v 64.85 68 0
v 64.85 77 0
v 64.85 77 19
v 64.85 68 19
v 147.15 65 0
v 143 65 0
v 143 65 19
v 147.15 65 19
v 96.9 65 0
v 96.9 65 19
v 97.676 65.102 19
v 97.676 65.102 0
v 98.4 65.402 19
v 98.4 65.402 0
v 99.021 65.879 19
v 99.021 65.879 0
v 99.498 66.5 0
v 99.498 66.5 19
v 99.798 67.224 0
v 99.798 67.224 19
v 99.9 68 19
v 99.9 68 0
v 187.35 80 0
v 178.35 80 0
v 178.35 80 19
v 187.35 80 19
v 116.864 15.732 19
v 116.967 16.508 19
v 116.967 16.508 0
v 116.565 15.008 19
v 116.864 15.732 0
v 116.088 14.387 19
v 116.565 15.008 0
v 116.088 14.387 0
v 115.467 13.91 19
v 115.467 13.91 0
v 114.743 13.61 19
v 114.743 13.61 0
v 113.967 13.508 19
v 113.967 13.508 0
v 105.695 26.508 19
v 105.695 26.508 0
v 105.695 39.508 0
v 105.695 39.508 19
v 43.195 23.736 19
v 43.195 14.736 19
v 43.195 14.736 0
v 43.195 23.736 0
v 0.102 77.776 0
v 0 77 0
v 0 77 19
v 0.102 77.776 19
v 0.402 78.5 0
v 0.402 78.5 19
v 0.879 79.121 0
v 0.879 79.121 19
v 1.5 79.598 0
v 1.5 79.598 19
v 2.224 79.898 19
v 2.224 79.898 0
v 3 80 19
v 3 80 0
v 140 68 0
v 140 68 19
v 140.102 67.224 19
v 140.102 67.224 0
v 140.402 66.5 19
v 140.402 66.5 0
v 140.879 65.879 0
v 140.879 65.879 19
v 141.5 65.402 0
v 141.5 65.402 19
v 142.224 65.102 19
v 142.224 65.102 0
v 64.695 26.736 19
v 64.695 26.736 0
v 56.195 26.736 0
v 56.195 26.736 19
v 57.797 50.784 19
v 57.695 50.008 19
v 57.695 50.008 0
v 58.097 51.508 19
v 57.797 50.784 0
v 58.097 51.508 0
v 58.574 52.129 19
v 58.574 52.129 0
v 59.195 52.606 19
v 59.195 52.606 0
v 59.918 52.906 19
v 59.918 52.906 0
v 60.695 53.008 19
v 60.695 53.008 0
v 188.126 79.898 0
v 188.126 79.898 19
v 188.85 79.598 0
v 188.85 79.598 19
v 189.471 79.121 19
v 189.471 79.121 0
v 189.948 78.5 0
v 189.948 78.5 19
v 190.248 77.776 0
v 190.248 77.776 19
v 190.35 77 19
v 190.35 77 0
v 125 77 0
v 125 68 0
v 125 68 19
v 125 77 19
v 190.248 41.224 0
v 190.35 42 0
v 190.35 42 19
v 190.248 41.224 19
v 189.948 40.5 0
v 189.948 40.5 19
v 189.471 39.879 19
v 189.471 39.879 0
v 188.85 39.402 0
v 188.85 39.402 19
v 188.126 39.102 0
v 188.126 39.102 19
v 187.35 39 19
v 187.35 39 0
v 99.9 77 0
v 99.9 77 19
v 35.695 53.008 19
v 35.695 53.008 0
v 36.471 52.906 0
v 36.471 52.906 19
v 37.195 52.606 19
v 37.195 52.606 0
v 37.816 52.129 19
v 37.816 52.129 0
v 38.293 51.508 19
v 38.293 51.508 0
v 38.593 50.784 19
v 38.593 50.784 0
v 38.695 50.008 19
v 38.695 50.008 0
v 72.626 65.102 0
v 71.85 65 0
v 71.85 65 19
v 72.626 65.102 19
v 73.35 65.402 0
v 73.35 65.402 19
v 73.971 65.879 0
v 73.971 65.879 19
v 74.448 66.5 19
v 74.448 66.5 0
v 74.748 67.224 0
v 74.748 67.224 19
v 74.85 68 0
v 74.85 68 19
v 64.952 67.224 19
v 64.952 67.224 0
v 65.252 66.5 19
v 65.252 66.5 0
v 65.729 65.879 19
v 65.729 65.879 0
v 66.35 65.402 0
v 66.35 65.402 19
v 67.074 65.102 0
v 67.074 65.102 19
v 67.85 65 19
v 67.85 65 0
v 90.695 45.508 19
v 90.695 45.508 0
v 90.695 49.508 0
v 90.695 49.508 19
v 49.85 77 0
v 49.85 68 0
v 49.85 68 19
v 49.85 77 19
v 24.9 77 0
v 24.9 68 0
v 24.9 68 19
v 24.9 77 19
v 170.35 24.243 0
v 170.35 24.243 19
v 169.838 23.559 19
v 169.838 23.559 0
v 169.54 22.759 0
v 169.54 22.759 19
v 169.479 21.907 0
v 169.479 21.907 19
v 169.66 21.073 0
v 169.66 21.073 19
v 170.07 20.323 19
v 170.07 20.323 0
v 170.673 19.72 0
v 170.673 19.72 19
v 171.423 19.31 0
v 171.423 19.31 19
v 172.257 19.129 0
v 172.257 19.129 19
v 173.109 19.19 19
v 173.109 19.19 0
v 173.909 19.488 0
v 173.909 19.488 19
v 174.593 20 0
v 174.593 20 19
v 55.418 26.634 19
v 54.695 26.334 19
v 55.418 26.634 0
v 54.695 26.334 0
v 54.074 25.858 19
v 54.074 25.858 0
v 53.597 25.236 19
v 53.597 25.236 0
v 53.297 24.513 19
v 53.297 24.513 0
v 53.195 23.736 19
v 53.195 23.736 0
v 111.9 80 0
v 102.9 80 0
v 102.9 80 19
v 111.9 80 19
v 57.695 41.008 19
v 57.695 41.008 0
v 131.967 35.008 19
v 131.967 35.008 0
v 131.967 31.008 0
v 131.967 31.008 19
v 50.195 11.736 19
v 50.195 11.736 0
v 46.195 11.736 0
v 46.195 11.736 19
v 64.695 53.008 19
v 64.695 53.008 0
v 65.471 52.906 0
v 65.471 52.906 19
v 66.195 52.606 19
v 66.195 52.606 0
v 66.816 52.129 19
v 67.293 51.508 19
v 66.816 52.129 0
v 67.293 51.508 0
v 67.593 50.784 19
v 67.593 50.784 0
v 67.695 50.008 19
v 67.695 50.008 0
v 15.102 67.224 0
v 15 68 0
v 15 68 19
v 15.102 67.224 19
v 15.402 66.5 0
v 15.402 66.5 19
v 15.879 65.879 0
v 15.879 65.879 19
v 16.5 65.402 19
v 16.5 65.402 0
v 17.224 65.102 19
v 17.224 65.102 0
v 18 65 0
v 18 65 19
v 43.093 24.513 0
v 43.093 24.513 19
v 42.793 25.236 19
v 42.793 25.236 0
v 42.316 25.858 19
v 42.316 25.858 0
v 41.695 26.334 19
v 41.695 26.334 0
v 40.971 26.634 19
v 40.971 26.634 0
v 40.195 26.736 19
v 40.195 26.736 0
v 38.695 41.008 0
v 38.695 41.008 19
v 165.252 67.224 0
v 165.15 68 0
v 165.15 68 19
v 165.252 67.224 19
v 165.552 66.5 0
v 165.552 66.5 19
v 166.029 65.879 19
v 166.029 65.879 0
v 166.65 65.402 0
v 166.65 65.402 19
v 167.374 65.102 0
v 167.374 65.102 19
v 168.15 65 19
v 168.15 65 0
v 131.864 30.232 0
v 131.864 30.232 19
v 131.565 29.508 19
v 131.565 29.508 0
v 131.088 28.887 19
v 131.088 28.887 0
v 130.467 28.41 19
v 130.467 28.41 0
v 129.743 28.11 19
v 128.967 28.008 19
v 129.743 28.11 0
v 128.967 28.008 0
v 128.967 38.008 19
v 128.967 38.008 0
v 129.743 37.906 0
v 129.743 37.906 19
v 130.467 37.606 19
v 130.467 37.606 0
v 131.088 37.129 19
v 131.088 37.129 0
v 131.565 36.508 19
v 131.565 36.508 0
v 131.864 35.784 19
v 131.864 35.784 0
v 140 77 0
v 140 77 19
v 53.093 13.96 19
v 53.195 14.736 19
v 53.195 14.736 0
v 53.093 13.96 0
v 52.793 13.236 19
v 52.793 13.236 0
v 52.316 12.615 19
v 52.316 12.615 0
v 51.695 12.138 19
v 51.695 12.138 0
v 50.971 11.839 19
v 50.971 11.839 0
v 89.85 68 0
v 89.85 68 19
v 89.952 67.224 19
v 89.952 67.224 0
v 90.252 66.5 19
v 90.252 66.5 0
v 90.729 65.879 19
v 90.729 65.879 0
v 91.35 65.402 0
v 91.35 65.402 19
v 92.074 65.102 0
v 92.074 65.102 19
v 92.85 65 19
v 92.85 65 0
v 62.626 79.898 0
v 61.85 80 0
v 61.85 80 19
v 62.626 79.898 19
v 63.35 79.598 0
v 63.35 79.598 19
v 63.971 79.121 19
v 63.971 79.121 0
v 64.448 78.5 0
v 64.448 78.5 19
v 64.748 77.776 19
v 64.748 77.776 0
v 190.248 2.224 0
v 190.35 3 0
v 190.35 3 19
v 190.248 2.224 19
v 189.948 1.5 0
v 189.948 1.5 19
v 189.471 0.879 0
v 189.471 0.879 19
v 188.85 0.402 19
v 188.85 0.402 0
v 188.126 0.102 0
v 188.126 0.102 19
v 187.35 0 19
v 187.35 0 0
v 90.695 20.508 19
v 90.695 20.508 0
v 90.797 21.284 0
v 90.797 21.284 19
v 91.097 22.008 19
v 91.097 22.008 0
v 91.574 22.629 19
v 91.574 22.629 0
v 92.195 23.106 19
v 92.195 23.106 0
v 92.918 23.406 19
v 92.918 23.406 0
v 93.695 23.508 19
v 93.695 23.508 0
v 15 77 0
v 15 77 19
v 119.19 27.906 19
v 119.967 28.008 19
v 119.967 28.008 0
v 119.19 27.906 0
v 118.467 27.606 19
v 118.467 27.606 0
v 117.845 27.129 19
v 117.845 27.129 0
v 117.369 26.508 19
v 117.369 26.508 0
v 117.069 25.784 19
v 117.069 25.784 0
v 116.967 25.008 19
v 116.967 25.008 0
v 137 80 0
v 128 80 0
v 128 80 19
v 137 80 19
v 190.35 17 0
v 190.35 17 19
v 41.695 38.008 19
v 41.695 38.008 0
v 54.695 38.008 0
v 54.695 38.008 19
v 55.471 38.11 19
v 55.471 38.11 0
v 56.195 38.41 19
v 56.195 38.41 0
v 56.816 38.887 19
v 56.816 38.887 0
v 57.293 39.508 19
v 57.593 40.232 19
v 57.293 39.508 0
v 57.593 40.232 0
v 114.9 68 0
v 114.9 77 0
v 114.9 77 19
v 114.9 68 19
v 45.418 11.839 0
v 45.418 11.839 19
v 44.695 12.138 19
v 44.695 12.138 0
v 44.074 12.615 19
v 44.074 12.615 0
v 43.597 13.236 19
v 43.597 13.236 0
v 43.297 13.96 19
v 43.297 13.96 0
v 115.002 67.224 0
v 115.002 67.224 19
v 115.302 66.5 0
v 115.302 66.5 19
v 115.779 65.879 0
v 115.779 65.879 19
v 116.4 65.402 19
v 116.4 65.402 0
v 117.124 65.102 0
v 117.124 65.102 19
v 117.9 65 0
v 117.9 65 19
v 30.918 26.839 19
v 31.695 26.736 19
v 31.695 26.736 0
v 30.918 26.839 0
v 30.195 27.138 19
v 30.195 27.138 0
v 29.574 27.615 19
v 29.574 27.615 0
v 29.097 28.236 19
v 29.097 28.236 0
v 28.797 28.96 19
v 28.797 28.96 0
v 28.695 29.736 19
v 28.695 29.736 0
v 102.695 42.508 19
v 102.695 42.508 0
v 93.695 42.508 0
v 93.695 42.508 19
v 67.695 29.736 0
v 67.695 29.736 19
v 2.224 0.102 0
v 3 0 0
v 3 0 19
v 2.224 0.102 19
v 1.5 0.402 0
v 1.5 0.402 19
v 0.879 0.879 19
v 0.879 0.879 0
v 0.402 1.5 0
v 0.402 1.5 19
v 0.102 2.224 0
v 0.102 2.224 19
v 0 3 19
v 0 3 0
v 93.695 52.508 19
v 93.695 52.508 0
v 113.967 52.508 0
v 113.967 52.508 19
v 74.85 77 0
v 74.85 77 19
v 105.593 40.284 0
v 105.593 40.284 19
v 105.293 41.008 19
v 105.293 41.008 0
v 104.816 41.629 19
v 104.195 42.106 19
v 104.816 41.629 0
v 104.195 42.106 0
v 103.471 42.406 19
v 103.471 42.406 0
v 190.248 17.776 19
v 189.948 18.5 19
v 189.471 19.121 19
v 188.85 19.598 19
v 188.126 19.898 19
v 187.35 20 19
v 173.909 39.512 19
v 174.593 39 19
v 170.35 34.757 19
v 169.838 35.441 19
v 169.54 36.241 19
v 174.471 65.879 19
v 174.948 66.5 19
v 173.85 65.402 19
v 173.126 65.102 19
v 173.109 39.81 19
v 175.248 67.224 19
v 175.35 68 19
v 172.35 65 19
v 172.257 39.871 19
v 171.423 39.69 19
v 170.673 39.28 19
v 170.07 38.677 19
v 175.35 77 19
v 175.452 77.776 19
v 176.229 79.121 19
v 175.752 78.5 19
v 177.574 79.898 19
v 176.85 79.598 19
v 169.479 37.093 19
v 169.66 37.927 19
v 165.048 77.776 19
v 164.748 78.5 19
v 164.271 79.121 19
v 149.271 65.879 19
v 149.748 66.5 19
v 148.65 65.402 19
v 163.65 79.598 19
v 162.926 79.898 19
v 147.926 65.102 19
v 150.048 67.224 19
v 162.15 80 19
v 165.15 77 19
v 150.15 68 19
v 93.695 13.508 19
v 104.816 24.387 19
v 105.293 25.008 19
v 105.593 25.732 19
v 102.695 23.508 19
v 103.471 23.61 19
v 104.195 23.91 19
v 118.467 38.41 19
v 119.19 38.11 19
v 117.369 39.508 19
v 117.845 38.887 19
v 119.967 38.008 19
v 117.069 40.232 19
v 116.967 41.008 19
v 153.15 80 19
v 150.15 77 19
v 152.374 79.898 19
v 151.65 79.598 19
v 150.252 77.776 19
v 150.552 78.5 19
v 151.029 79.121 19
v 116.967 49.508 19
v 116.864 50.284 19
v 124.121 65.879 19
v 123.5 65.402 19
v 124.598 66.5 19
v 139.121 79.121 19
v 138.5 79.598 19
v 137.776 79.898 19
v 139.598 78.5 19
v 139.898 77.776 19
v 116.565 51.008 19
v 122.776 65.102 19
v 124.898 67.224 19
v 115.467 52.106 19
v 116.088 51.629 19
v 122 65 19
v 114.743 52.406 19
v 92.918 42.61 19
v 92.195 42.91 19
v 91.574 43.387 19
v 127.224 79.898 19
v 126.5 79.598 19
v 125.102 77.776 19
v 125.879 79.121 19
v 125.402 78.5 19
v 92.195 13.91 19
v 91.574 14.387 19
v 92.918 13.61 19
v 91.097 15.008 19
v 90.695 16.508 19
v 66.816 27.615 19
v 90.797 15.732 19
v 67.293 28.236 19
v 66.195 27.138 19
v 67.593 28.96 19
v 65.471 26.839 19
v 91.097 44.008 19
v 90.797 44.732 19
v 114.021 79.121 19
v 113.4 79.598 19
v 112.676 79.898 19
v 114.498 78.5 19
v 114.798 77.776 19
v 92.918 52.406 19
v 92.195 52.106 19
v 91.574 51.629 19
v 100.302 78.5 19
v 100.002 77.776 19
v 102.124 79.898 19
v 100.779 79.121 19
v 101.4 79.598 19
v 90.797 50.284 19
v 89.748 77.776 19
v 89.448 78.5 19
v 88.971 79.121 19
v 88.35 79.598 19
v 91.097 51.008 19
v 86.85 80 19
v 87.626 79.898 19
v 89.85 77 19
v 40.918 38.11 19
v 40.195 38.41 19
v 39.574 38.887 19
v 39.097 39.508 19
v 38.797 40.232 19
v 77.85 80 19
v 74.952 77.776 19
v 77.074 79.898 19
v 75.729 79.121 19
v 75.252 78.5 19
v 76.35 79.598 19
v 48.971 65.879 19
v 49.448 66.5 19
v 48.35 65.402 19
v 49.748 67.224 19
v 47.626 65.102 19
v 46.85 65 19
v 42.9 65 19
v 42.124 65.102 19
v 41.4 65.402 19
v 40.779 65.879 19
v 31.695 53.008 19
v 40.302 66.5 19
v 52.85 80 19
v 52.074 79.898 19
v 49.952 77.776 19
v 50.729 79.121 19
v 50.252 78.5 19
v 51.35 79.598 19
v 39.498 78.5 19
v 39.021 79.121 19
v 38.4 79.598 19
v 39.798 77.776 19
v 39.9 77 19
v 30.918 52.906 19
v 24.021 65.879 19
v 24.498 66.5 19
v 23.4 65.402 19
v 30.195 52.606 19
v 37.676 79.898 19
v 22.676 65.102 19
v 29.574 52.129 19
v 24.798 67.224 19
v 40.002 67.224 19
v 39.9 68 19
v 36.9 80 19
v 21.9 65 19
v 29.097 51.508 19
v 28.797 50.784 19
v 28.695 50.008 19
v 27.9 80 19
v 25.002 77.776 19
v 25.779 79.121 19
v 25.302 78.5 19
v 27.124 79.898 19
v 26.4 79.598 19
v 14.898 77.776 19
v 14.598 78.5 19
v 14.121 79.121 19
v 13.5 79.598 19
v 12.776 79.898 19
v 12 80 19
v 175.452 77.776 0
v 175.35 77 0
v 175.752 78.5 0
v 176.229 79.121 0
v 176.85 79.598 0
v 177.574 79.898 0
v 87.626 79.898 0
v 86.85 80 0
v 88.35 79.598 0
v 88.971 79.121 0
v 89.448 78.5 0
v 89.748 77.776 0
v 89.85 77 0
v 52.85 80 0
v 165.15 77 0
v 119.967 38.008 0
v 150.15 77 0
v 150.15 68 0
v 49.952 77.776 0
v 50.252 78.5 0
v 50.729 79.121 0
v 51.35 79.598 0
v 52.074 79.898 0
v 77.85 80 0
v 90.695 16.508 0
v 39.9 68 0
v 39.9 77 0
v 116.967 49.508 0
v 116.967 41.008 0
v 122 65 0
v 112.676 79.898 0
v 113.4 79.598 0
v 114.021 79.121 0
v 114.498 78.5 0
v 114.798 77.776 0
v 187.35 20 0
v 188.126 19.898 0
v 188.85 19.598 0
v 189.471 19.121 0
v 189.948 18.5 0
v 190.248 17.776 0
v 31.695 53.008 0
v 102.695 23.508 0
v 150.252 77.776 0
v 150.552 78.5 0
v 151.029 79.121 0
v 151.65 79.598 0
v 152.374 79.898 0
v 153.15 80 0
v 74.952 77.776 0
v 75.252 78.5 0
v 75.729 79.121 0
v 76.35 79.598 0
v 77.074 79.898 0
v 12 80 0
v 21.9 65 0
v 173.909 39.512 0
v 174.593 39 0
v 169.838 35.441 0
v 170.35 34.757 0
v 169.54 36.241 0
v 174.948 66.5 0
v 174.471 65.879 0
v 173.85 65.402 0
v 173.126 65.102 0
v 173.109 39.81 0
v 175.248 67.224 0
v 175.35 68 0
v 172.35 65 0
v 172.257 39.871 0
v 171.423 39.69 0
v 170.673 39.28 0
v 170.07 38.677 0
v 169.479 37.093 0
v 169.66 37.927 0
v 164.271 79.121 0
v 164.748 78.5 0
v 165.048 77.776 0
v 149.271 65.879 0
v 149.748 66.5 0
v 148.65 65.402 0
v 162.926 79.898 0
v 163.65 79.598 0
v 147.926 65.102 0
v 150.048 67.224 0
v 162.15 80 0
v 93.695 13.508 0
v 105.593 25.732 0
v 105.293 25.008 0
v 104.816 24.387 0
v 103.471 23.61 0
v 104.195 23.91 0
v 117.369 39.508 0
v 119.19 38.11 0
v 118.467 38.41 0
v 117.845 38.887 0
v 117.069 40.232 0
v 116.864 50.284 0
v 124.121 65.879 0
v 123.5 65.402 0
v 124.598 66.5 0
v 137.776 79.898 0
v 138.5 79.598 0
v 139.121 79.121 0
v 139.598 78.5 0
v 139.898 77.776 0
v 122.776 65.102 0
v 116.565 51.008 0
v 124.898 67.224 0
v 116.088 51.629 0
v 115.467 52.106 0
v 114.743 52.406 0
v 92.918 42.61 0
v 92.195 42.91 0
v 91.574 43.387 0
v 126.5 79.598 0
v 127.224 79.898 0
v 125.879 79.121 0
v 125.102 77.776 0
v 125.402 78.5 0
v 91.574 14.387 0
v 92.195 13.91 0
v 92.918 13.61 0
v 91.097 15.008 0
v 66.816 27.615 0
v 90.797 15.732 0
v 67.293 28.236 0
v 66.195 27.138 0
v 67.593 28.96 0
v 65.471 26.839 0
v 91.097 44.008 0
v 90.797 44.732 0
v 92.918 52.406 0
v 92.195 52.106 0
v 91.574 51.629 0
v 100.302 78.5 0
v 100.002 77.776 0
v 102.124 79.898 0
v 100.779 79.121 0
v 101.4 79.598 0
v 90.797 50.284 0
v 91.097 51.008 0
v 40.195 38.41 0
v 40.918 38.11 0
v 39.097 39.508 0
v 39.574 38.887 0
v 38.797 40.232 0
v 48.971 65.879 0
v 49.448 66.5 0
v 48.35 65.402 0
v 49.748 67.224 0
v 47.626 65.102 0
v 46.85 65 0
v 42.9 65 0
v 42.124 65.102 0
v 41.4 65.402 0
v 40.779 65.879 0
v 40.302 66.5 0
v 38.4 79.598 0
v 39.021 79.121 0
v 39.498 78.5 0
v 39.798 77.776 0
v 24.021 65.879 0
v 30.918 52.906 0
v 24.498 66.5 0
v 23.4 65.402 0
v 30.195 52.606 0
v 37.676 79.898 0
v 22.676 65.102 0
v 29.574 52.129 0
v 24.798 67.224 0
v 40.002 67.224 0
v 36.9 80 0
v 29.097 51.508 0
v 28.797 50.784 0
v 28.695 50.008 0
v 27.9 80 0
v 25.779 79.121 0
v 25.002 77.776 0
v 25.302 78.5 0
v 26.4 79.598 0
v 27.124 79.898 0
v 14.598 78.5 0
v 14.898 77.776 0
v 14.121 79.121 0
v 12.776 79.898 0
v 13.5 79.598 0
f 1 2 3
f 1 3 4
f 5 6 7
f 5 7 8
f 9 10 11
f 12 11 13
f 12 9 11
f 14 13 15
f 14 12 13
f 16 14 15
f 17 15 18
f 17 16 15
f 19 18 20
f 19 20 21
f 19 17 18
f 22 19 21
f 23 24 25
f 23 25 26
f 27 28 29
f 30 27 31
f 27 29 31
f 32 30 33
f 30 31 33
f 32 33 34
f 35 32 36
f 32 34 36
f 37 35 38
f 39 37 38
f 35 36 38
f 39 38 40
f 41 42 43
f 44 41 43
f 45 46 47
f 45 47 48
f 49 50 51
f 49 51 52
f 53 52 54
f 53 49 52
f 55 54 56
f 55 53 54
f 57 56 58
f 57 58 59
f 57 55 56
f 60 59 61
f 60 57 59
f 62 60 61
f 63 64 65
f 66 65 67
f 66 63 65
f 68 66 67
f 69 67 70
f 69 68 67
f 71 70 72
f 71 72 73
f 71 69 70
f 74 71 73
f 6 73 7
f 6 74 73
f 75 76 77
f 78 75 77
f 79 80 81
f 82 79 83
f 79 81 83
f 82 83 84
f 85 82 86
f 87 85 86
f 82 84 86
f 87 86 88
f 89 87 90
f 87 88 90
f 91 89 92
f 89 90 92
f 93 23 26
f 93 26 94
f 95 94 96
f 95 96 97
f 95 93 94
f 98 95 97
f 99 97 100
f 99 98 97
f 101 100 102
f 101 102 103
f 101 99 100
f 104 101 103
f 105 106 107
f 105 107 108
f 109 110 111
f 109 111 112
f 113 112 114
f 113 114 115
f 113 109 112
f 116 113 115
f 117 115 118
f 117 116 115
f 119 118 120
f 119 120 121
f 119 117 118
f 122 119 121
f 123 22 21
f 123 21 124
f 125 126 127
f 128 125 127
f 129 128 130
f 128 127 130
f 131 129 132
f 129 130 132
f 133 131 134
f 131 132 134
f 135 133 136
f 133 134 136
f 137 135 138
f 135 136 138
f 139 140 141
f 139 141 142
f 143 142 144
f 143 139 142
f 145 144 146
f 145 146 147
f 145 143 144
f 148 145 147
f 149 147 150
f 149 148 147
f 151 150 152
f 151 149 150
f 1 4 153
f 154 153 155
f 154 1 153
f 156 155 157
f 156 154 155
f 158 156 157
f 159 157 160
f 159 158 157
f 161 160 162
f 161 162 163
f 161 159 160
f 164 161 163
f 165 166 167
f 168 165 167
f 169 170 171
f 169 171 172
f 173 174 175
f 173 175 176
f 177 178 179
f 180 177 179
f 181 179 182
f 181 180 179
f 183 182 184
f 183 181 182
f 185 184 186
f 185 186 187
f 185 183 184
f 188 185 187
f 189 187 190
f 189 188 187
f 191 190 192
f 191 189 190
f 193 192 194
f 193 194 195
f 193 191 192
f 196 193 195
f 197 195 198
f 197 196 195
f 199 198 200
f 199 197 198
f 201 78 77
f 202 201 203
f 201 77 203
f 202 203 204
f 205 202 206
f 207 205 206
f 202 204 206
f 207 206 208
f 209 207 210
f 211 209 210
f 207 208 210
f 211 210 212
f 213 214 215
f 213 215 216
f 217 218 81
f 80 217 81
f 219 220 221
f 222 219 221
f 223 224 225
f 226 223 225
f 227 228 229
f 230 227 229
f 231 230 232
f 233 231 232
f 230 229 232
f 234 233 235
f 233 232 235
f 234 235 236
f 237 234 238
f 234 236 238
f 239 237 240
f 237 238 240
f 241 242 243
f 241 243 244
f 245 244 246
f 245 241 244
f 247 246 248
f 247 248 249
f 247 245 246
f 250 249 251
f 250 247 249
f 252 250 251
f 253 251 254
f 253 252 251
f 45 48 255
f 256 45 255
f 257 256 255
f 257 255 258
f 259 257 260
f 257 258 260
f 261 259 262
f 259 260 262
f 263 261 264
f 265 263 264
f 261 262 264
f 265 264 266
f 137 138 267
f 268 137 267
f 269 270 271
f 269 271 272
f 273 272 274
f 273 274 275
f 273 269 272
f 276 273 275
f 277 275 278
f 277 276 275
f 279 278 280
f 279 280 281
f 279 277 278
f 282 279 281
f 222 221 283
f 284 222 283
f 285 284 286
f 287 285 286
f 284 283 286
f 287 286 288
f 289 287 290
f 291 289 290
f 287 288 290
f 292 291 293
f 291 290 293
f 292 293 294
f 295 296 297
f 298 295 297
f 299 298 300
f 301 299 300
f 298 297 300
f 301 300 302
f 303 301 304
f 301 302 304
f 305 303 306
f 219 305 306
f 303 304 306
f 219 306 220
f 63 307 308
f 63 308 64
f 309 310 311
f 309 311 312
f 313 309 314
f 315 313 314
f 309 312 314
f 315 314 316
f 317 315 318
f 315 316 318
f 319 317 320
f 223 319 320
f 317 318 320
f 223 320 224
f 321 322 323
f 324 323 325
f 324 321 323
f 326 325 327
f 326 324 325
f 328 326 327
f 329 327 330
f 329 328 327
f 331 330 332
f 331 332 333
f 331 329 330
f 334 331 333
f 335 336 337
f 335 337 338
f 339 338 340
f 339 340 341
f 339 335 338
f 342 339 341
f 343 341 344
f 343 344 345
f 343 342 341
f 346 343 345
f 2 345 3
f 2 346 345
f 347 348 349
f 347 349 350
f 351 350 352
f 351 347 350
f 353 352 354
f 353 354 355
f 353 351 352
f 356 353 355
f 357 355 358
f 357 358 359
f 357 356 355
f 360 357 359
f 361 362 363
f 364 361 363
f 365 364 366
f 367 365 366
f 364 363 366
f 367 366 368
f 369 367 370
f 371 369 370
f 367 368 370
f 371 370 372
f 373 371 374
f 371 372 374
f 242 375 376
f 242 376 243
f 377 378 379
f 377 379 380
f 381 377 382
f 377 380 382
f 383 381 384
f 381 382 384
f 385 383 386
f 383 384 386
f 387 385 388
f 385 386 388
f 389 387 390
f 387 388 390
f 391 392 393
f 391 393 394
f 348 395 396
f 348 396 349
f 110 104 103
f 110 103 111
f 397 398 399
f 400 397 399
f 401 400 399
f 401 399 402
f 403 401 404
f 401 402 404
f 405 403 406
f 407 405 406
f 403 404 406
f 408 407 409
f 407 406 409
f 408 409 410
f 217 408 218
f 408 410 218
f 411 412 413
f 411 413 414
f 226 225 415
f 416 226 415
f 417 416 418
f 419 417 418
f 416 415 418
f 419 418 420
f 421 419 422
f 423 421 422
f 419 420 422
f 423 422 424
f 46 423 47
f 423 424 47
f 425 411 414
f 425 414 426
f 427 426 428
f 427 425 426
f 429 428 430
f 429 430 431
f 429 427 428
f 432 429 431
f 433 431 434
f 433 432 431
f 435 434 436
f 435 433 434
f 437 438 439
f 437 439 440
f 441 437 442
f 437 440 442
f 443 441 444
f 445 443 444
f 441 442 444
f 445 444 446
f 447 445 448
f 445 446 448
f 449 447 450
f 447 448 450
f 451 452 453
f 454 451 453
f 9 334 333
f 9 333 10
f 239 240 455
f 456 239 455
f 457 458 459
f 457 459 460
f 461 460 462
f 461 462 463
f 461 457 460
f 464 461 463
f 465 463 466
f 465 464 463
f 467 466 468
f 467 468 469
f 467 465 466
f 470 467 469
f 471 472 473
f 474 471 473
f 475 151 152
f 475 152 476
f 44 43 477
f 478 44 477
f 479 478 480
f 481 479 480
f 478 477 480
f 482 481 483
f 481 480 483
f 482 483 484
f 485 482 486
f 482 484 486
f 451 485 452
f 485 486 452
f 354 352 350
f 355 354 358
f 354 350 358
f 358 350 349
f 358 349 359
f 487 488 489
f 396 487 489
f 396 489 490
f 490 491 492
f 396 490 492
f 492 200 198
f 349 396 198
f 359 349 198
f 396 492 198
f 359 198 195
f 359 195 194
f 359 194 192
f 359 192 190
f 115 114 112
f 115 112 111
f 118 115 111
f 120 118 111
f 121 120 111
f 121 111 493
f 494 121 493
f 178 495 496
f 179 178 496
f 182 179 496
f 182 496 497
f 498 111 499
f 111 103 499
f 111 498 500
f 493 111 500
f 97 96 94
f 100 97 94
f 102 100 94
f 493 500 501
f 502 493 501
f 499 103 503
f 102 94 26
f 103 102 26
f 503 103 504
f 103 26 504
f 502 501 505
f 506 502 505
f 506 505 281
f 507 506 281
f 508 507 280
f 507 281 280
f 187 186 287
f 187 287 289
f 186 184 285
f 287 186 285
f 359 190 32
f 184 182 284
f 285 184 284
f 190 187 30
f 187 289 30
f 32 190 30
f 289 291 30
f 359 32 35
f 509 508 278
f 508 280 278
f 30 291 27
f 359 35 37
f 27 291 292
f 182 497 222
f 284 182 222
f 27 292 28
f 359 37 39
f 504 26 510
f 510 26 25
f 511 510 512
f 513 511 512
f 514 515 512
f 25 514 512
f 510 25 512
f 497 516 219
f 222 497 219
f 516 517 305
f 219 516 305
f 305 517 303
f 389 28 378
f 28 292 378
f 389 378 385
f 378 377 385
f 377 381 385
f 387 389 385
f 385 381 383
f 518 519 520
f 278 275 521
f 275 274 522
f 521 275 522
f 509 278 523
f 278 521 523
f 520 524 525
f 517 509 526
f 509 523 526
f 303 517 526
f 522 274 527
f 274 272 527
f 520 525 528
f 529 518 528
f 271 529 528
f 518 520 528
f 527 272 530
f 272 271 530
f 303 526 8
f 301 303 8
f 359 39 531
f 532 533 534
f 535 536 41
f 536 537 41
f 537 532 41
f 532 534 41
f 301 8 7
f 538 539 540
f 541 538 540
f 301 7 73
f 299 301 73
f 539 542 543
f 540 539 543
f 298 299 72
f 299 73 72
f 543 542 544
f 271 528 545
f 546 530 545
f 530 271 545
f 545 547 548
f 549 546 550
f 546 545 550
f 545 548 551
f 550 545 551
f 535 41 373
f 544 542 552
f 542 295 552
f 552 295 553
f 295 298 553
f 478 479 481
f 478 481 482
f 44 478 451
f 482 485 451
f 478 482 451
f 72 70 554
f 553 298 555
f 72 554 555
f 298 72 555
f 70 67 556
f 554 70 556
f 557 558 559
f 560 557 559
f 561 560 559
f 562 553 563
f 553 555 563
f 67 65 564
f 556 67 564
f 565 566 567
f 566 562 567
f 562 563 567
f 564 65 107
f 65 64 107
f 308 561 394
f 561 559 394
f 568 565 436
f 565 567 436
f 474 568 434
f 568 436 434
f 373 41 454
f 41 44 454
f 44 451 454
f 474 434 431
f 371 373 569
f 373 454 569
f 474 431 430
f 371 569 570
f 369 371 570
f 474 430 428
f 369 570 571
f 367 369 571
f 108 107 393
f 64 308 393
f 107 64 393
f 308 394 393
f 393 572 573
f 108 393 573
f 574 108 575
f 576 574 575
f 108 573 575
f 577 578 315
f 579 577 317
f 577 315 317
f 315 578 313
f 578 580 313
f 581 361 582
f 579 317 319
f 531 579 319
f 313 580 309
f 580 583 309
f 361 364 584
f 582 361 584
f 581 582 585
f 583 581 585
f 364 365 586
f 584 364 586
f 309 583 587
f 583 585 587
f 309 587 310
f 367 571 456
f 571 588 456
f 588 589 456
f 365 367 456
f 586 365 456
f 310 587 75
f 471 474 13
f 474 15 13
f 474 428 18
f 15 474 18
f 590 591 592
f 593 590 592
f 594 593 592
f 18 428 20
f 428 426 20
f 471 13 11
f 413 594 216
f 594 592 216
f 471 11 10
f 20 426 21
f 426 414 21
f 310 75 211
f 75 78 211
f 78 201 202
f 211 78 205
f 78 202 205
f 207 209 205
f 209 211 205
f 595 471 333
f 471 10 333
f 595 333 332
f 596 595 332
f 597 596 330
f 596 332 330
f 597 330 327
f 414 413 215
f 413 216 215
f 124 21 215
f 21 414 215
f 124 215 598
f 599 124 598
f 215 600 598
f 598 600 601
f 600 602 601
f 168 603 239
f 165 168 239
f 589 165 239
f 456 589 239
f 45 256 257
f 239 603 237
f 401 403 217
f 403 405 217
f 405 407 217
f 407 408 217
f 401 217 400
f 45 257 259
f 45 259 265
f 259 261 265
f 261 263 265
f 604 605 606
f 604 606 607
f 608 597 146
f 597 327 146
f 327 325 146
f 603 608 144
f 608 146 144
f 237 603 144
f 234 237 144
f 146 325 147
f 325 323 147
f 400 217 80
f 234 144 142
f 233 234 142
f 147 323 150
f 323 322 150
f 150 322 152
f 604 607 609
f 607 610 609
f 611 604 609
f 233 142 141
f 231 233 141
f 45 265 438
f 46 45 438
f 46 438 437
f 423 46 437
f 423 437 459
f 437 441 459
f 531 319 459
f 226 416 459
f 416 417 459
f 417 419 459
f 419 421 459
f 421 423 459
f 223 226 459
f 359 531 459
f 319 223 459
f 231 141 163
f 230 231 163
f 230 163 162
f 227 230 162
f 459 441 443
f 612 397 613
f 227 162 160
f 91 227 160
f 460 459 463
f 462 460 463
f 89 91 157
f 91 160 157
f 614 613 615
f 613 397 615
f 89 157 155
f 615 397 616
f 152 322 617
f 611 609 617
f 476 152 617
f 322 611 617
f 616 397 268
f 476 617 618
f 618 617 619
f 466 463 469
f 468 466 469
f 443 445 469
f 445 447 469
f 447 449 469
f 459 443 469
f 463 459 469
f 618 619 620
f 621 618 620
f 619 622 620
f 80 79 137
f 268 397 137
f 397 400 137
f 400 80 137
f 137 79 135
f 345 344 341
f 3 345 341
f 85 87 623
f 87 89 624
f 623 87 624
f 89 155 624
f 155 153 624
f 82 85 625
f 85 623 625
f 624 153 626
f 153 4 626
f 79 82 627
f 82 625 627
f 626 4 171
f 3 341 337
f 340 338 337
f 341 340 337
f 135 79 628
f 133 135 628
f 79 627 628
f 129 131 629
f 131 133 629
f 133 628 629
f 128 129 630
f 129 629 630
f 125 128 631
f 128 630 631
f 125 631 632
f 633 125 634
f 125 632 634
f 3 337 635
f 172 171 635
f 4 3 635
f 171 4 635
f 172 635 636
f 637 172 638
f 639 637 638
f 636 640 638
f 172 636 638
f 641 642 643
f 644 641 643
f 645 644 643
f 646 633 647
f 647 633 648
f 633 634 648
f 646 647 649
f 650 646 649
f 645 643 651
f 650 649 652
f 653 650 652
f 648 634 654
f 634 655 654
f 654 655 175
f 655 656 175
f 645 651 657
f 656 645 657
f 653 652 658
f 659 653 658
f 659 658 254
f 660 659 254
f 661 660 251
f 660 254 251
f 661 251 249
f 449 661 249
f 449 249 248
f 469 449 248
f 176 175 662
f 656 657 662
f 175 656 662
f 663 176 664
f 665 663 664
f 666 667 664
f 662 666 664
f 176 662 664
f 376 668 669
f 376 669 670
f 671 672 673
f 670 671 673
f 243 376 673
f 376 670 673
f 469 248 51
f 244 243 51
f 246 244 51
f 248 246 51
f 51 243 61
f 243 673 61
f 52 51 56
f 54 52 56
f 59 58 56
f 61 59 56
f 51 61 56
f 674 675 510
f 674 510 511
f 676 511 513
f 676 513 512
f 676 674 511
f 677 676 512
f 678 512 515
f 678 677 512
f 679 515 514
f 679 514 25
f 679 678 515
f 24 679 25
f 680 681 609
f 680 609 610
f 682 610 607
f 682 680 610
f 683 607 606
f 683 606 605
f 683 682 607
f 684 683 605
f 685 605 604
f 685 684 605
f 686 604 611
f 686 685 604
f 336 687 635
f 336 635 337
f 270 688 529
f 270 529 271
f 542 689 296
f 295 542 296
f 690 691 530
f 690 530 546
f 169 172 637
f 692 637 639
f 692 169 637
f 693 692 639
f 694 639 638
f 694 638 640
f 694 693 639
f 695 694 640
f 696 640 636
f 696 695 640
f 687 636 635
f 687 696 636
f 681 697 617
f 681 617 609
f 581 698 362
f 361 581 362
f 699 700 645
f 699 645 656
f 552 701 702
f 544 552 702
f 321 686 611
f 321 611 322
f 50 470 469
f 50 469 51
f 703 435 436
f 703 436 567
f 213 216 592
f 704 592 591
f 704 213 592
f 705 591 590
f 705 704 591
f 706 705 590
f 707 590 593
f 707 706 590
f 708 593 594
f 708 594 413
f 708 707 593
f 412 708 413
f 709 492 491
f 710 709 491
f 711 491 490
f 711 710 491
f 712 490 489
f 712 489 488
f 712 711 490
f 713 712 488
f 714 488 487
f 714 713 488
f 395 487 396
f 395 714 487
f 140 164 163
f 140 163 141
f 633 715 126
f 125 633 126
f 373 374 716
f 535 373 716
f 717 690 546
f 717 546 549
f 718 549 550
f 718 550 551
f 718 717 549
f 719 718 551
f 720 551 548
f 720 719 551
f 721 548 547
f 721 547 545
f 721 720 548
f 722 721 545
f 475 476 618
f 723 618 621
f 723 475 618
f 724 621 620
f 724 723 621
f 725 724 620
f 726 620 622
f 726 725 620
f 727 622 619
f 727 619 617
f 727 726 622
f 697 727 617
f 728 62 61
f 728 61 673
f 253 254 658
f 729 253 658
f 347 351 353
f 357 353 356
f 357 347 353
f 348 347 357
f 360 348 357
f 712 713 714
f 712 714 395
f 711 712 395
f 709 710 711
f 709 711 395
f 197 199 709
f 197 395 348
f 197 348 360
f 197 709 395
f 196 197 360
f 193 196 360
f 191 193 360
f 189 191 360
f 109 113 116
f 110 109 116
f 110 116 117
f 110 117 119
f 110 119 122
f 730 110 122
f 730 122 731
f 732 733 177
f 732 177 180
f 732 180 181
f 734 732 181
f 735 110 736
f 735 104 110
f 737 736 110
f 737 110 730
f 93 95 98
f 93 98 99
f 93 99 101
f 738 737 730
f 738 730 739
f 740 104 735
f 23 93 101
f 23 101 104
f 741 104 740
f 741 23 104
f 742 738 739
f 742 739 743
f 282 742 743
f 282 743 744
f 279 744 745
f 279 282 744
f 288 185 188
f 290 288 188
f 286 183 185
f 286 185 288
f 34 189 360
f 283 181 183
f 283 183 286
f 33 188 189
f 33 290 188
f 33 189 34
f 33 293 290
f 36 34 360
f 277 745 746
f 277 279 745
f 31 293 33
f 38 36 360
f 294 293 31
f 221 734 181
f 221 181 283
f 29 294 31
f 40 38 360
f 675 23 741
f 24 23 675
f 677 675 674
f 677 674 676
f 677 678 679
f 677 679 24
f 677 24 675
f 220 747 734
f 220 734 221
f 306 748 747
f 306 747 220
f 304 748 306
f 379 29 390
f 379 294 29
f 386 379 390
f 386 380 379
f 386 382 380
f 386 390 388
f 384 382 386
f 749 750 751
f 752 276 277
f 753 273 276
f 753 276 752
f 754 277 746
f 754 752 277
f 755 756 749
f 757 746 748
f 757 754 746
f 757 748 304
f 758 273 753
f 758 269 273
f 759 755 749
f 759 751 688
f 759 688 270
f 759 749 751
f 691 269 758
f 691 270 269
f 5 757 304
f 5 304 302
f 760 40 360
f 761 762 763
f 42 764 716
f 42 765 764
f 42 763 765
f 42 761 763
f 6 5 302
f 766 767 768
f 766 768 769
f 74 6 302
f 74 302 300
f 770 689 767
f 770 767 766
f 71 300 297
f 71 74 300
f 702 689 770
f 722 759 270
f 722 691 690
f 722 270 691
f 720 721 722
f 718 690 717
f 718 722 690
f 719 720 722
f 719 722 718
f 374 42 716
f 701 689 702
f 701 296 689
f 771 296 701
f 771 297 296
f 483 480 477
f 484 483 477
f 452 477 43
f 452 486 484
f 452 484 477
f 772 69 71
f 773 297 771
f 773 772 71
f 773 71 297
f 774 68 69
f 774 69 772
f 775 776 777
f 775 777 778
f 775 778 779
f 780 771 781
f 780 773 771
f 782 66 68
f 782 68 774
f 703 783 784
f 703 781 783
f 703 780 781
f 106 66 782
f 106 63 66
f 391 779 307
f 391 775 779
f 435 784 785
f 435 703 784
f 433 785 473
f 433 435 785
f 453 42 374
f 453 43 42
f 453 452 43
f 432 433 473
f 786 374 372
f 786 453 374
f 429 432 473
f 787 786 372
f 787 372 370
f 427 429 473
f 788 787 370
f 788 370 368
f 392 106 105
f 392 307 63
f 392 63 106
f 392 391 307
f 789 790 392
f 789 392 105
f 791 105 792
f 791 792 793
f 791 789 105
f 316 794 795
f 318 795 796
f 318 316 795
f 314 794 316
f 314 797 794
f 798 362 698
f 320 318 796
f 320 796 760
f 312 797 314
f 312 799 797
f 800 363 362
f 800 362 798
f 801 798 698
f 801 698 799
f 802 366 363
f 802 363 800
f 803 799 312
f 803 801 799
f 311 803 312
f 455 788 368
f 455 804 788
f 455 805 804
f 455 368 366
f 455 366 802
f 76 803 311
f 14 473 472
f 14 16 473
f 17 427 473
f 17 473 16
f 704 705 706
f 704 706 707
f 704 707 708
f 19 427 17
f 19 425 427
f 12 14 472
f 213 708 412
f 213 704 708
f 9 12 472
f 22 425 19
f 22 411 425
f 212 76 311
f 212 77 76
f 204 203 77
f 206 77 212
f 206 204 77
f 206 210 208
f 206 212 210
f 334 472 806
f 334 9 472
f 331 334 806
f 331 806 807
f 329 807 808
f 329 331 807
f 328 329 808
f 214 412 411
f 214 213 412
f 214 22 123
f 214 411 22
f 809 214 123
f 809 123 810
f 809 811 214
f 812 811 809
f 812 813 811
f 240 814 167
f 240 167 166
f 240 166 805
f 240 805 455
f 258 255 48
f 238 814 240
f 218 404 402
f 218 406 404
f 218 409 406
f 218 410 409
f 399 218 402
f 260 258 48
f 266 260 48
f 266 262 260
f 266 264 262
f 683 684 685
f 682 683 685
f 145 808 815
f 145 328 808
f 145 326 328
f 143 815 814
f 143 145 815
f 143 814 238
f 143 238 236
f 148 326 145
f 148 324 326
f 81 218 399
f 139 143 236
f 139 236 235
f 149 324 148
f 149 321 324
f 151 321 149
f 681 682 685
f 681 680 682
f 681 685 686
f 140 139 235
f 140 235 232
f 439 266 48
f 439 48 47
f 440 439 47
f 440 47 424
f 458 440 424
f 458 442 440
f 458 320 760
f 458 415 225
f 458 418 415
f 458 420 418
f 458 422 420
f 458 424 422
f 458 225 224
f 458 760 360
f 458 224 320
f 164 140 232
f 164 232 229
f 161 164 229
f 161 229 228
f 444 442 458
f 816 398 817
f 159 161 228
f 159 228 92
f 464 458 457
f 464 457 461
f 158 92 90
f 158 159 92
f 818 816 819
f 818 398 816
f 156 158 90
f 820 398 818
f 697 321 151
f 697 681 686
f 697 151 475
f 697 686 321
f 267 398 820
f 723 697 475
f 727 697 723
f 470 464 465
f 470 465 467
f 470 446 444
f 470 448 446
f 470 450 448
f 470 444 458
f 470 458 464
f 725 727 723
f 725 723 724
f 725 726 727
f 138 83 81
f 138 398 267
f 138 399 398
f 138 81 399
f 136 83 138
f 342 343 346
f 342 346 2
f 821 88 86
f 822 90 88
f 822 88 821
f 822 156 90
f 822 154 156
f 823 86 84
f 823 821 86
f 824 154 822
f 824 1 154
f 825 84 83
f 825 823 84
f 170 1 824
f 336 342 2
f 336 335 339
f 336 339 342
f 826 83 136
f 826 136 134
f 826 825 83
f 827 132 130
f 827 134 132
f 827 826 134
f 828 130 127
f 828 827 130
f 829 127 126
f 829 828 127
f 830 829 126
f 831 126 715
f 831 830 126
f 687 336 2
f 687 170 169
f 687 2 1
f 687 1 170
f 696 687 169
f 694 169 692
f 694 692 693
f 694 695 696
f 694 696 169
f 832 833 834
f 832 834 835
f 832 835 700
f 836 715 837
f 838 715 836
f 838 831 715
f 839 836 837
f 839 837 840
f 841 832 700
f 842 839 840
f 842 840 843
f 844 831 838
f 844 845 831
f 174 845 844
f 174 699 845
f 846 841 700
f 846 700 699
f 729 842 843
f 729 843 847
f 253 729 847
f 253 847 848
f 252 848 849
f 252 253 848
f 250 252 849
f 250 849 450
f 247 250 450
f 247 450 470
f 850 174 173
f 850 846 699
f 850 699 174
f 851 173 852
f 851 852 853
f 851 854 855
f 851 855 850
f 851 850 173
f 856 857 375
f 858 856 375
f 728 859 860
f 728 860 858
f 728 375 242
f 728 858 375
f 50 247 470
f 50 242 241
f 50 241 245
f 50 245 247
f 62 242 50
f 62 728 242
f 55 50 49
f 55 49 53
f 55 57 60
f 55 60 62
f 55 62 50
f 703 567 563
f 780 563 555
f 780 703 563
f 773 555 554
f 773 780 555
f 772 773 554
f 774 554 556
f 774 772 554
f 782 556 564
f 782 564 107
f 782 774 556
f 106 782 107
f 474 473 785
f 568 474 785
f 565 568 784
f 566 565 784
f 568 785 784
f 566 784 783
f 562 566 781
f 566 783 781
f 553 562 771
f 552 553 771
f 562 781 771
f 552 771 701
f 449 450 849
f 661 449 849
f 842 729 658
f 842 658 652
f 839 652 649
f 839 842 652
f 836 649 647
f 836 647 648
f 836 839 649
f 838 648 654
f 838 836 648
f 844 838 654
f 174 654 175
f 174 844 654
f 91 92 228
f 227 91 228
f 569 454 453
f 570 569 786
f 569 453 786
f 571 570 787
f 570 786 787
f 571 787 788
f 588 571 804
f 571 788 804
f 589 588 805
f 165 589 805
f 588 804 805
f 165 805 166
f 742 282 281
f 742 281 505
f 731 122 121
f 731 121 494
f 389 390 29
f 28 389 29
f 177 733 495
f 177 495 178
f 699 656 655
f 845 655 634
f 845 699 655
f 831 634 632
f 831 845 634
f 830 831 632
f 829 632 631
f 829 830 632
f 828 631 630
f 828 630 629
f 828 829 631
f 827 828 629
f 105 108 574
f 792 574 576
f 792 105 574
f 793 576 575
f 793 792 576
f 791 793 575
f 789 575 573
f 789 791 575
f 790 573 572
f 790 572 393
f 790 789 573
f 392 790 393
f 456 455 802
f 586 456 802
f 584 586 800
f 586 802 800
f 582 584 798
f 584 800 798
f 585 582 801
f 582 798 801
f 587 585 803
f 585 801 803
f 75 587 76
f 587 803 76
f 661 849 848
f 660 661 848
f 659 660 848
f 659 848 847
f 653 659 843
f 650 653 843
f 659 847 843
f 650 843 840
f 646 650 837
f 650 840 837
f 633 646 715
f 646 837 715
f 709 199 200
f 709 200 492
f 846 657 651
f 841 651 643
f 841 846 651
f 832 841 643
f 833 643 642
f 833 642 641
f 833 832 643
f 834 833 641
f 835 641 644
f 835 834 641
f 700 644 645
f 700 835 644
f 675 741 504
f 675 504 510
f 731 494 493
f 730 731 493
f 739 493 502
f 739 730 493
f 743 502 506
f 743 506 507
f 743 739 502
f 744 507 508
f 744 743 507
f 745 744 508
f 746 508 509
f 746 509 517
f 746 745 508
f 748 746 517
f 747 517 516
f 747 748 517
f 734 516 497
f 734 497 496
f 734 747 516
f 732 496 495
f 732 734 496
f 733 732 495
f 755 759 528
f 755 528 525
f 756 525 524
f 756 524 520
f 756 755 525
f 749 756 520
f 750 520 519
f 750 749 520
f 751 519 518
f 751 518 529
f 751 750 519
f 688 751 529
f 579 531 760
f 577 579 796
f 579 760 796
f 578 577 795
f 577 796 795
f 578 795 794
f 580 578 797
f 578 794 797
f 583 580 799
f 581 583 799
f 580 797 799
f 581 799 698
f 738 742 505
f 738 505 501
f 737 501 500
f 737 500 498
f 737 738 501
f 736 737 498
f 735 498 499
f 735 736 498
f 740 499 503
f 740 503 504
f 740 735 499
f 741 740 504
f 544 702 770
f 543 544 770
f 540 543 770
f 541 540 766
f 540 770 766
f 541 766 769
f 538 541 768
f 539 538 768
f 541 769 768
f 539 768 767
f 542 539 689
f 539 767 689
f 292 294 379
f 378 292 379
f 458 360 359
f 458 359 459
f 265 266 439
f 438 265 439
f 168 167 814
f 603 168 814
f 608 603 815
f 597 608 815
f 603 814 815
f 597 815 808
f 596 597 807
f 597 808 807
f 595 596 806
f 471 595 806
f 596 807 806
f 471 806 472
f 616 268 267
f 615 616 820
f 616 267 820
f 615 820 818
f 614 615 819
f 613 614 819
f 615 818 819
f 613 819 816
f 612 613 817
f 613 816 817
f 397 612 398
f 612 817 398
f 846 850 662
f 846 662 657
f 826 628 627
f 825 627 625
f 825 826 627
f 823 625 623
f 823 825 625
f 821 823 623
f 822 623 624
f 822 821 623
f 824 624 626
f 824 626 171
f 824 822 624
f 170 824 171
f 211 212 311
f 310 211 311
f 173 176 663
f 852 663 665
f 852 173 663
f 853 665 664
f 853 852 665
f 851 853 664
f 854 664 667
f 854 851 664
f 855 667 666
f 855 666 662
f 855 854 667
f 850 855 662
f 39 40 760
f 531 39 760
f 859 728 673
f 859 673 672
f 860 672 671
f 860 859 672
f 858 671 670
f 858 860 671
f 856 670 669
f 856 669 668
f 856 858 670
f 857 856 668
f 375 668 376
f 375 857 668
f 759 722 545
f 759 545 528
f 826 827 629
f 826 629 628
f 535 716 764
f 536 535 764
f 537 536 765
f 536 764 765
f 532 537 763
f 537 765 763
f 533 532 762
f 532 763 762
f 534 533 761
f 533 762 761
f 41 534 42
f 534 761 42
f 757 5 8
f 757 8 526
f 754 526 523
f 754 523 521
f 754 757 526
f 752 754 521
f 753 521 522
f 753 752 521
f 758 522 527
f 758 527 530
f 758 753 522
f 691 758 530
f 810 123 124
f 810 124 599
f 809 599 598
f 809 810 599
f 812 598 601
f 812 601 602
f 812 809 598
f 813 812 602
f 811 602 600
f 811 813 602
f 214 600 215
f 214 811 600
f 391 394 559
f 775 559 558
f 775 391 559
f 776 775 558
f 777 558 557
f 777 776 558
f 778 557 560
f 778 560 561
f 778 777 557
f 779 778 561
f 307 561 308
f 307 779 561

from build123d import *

# Parameters (mm, degrees)
BOSS_EXTRUDE1_DEPTH = 19


with BuildPart() as part:
    # Sketch1 → Boss-Extrude1 (new body)
    with BuildSketch(Plane.XY):
        with BuildLine():
            Line((18, 65), (21.9, 65))
            ThreePointArc((21.9, 65), (24.021320344, 65.878679656), (24.9, 68))
            Line((24.9, 68), (24.9, 77))
            ThreePointArc((24.9, 77), (25.778679656, 79.121320344), (27.9, 80))
            Line((27.9, 80), (36.9, 80))
            ThreePointArc((36.9, 80), (39.021320344, 79.121320344), (39.9, 77))
            Line((39.9, 77), (39.9, 68))
            ThreePointArc((39.9, 68), (40.778679656, 65.878679656), (42.9, 65))
            Line((42.9, 65), (46.85, 65))
            ThreePointArc((46.85, 65), (48.971320344, 65.878679656), (49.85, 68))
            Line((49.85, 68), (49.85, 77))
            ThreePointArc((49.85, 77), (50.728679656, 79.121320344), (52.85, 80))
            Line((52.85, 80), (61.85, 80))
            ThreePointArc((61.85, 80), (63.971320344, 79.121320344), (64.85, 77))
            Line((64.85, 77), (64.85, 68))
            ThreePointArc((64.85, 68), (65.728679656, 65.878679656), (67.85, 65))
            Line((67.85, 65), (71.85, 65))
            ThreePointArc((71.85, 65), (73.971320344, 65.878679656), (74.85, 68))
            Line((74.85, 68), (74.85, 77))
            ThreePointArc((74.85, 77), (75.728679656, 79.121320344), (77.85, 80))
            Line((77.85, 80), (86.85, 80))
            ThreePointArc((86.85, 80), (88.971320344, 79.121320344), (89.85, 77))
            Line((89.85, 77), (89.85, 68))
            ThreePointArc((89.85, 68), (90.728679656, 65.878679656), (92.85, 65))
            Line((92.85, 65), (96.9, 65))
            ThreePointArc((96.9, 65), (99.021320344, 65.878679656), (99.9, 68))
            Line((99.9, 68), (99.9, 77))
            ThreePointArc((99.9, 77), (100.778679656, 79.121320344), (102.9, 80))
            Line((102.9, 80), (111.9, 80))
            ThreePointArc((111.9, 80), (114.021320344, 79.121320344), (114.9, 77))
            Line((114.9, 77), (114.9, 68))
            ThreePointArc((114.9, 68), (115.778679656, 65.878679656), (117.9, 65))
            Line((117.9, 65), (122, 65))
            ThreePointArc((122, 65), (124.121320344, 65.878679656), (125, 68))
            Line((125, 68), (125, 77))
            ThreePointArc((125, 77), (125.878679656, 79.121320344), (128, 80))
            Line((128, 80), (137, 80))
            ThreePointArc((137, 80), (139.121320344, 79.121320344), (140, 77))
            Line((140, 77), (140, 68))
            ThreePointArc((140, 68), (140.878679656, 65.878679656), (143, 65))
            Line((143, 65), (147.15, 65))
            ThreePointArc((147.15, 65), (149.271320344, 65.878679656), (150.15, 68))
            Line((150.15, 68), (150.15, 77))
            ThreePointArc((150.15, 77), (151.028679656, 79.121320344), (153.15, 80))
            Line((153.15, 80), (162.15, 80))
            ThreePointArc((162.15, 80), (164.271320344, 79.121320344), (165.15, 77))
            Line((165.15, 77), (165.15, 68))
            ThreePointArc((165.15, 68), (166.028679656, 65.878679656), (168.15, 65))
            Line((168.15, 65), (172.35, 65))
            ThreePointArc((172.35, 65), (174.471320344, 65.878679656), (175.35, 68))
            Line((175.35, 68), (175.35, 77))
            ThreePointArc((175.35, 77), (176.228679656, 79.121320344), (178.35, 80))
            Line((178.35, 80), (187.35, 80))
            ThreePointArc((187.35, 80), (189.471320344, 79.121320344), (190.35, 77))
            Line((190.35, 77), (190.35, 42))
            ThreePointArc((190.35, 42), (189.471320344, 39.878679656), (187.35, 39))
            Line((187.35, 39), (174.592640687, 39))
            ThreePointArc((174.592640687, 39), (170.35, 39), (170.35, 34.757359313))
            Line((170.35, 34.757359313), (170.35, 24.242640687))
            ThreePointArc((170.35, 24.242640687), (170.35, 20), (174.592640687, 20))
            Line((174.592640687, 20), (187.35, 20))
            ThreePointArc((187.35, 20), (189.471320344, 19.121320344), (190.35, 17))
            Line((190.35, 17), (190.35, 3))
            ThreePointArc((190.35, 3), (189.471320344, 0.878679656), (187.35, 0))
            Line((187.35, 0), (3, 0))
            ThreePointArc((3, 0), (0.878679656, 0.878679656), (0, 3))
            Line((0, 3), (0, 77))
            ThreePointArc((0, 77), (0.878679656, 79.121320344), (3, 80))
            Line((3, 80), (12, 80))
            ThreePointArc((12, 80), (14.121320344, 79.121320344), (15, 77))
            Line((15, 77), (15, 68))
            ThreePointArc((15, 68), (15.878679656, 65.878679656), (18, 65))
        make_face()
        with BuildLine():
            Line((31.694947257, 53.008010391), (35.694947257, 53.008010391))
            ThreePointArc((35.694947257, 53.008010391), (37.8162676, 52.129330734), (38.694947257, 50.008010391))
            Line((38.694947257, 50.008010391), (38.694947257, 41.008010391))
            ThreePointArc((38.694947257, 41.008010391), (39.573626913, 38.886690047), (41.694947257, 38.008010391))
            Line((41.694947257, 38.008010391), (54.694947257, 38.008010391))
            ThreePointArc((54.694947257, 38.008010391), (56.8162676, 38.886690047), (57.694947257, 41.008010391))
            Line((57.694947257, 41.008010391), (57.694947257, 50.008010391))
            ThreePointArc((57.694947257, 50.008010391), (58.573626913, 52.129330734), (60.694947257, 53.008010391))
            Line((60.694947257, 53.008010391), (64.694947257, 53.008010391))
            ThreePointArc((64.694947257, 53.008010391), (66.8162676, 52.129330734), (67.694947257, 50.008010391))
            Line((67.694947257, 50.008010391), (67.694947257, 41.008010391))
            Line((67.694947257, 41.008010391), (67.694947257, 29.736314532))
            ThreePointArc((67.694947257, 29.736314532), (66.8162676, 27.614994188), (64.694947257, 26.736314532))
            Line((64.694947257, 26.736314532), (56.194947257, 26.736314532))
            ThreePointArc((56.194947257, 26.736314532), (54.073626913, 25.857634875), (53.194947257, 23.736314532))
            Line((53.194947257, 23.736314532), (53.194947257, 14.736314532))
            ThreePointArc((53.194947257, 14.736314532), (52.3162676, 12.614994188), (50.194947257, 11.736314532))
            Line((50.194947257, 11.736314532), (46.194947257, 11.736314532))
            ThreePointArc((46.194947257, 11.736314532), (44.073626913, 12.614994188), (43.194947257, 14.736314532))
            Line((43.194947257, 14.736314532), (43.194947257, 23.736314532))
            ThreePointArc((43.194947257, 23.736314532), (42.3162676, 25.857634875), (40.194947257, 26.736314532))
            Line((40.194947257, 26.736314532), (31.694947257, 26.736314532))
            ThreePointArc((31.694947257, 26.736314532), (29.573626913, 27.614994188), (28.694947257, 29.736314532))
            Line((28.694947257, 29.736314532), (28.694947257, 41.008010391))
            Line((28.694947257, 41.008010391), (28.694947257, 50.008010391))
            ThreePointArc((28.694947257, 50.008010391), (29.573626913, 52.129330734), (31.694947257, 53.008010391))
        make_face(mode=Mode.SUBTRACT)
        with BuildLine():
            Line((90.694947257, 16.508010391), (90.694947257, 20.508010391))
            ThreePointArc((90.694947257, 20.508010391), (91.573626913, 22.629330734), (93.694947257, 23.508010391))
            Line((93.694947257, 23.508010391), (102.694947257, 23.508010391))
            ThreePointArc((102.694947257, 23.508010391), (104.8162676, 24.386690047), (105.694947257, 26.508010391))
            Line((105.694947257, 26.508010391), (105.694947257, 39.508010391))
            ThreePointArc((105.694947257, 39.508010391), (104.8162676, 41.629330734), (102.694947257, 42.508010391))
            Line((102.694947257, 42.508010391), (93.694947257, 42.508010391))
            ThreePointArc((93.694947257, 42.508010391), (91.573626913, 43.386690047), (90.694947257, 45.508010391))
            Line((90.694947257, 45.508010391), (90.694947257, 49.508010391))
            ThreePointArc((90.694947257, 49.508010391), (91.573626913, 51.629330734), (93.694947257, 52.508010391))
            Line((93.694947257, 52.508010391), (102.694947257, 52.508010391))
            Line((102.694947257, 52.508010391), (113.966643115, 52.508010391))
            ThreePointArc((113.966643115, 52.508010391), (116.087963459, 51.629330734), (116.966643115, 49.508010391))
            Line((116.966643115, 49.508010391), (116.966643115, 41.008010391))
            ThreePointArc((116.966643115, 41.008010391), (117.845322772, 38.886690047), (119.966643115, 38.008010391))
            Line((119.966643115, 38.008010391), (128.966643115, 38.008010391))
            ThreePointArc((128.966643115, 38.008010391), (131.087963459, 37.129330734), (131.966643115, 35.008010391))
            Line((131.966643115, 35.008010391), (131.966643115, 31.008010391))
            ThreePointArc((131.966643115, 31.008010391), (131.087963459, 28.886690047), (128.966643115, 28.008010391))
            Line((128.966643115, 28.008010391), (119.966643115, 28.008010391))
            ThreePointArc((119.966643115, 28.008010391), (117.845322772, 27.129330734), (116.966643115, 25.008010391))
            Line((116.966643115, 25.008010391), (116.966643115, 16.508010391))
            ThreePointArc((116.966643115, 16.508010391), (116.087963459, 14.386690047), (113.966643115, 13.508010391))
            Line((113.966643115, 13.508010391), (102.694947257, 13.508010391))
            Line((102.694947257, 13.508010391), (93.694947257, 13.508010391))
            ThreePointArc((93.694947257, 13.508010391), (91.573626913, 14.386690047), (90.694947257, 16.508010391))
        make_face(mode=Mode.SUBTRACT)
    extrude(amount=BOSS_EXTRUDE1_DEPTH)


solid = part.part
